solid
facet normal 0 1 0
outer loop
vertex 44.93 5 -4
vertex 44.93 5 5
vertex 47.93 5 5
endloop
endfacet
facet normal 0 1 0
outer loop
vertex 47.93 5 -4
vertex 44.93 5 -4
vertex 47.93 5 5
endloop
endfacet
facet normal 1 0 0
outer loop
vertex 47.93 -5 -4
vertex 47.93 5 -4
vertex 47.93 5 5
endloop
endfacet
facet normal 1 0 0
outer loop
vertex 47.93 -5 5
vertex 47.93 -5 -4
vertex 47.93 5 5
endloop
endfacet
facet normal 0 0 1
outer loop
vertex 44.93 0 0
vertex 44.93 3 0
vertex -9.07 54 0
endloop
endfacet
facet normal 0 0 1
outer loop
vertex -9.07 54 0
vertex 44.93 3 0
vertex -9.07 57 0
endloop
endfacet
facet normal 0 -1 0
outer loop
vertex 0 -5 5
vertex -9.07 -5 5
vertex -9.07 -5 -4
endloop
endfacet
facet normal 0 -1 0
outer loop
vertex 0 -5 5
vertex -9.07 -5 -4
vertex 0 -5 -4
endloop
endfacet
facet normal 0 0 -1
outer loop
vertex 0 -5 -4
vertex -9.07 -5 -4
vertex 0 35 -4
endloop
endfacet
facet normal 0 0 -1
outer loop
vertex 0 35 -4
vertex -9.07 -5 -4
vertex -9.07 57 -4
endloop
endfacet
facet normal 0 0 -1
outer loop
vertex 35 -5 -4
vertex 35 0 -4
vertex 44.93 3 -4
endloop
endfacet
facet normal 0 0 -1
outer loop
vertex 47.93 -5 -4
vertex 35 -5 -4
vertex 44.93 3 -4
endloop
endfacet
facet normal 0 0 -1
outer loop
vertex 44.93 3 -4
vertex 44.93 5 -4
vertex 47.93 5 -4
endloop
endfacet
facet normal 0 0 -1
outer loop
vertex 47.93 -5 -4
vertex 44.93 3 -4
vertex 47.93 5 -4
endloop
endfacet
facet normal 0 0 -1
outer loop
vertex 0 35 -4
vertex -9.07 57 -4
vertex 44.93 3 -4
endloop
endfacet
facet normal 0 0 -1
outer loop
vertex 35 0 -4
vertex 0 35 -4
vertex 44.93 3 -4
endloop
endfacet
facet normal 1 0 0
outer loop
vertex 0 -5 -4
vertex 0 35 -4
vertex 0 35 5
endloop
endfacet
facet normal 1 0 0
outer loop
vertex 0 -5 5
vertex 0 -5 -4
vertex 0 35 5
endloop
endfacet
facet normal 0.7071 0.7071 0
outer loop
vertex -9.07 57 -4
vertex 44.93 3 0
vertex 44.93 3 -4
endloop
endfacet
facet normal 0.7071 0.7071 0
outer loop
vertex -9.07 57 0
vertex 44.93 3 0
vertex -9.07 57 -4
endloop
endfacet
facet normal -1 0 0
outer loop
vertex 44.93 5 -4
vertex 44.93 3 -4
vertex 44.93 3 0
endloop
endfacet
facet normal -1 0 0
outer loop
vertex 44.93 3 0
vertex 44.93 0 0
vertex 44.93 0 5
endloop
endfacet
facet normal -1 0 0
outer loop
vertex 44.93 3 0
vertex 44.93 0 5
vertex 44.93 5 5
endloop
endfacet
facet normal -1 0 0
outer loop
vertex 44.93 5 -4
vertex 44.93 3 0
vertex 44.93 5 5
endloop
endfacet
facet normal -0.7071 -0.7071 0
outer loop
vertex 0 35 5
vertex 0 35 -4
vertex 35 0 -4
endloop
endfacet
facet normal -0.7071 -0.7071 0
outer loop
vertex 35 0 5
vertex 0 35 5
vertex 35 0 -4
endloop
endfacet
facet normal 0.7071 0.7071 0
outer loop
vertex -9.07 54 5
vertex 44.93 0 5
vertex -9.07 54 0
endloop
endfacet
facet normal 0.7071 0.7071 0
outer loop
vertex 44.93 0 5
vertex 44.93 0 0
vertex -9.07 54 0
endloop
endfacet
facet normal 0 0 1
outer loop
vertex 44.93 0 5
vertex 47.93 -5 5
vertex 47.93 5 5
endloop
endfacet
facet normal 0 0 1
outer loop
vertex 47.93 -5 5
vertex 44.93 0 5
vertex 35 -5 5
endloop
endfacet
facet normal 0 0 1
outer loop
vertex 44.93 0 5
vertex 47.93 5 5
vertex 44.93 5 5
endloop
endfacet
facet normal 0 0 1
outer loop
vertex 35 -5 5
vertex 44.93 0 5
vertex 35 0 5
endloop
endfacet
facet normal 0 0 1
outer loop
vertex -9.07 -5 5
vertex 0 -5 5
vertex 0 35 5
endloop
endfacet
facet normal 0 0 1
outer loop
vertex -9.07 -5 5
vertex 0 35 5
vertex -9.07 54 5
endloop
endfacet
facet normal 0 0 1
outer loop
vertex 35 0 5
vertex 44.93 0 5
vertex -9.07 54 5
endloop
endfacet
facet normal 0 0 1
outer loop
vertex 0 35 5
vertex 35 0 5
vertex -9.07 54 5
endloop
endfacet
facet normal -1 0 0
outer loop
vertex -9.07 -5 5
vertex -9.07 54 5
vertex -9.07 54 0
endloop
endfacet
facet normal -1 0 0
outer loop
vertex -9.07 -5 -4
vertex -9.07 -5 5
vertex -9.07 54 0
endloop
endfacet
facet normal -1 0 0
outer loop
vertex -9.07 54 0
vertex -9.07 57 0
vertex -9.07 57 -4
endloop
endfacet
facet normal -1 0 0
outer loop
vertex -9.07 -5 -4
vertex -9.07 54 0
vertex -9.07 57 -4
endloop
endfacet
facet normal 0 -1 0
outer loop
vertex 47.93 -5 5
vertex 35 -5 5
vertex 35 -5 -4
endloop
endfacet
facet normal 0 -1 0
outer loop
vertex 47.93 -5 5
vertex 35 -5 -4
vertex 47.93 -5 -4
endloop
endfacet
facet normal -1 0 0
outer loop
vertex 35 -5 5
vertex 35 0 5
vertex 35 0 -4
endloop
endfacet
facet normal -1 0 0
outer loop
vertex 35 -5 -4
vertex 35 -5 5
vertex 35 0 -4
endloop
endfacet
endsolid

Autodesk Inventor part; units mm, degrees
ref_plane "YZ Plane" through (0, 0, 0) normal (1, 0, 0) x (0, 1, 0)
ref_plane "XZ Plane" through (0, 0, 0) normal (0, 1, 0) x (-1, 0, 0)
sketch "Boceto1" plane through (0, 0, 0) normal (0, 0, 1) x (1, 0, 0)
  line L0 (-9.0701, 0) -> (44.9299, 0)
  line L1 (44.9299, 0) -> (-9.0701, 54)
  line L2 (-9.0701, 0) -> (-9.0701, 54)
  point P0 (0, 0)
  dimension "d0" = 54
  dimension "d2" = 45
extrude "Extrusión1" add sketch "Boceto1" along normal blind 5
sketch "Boceto2" plane through (0, 0, 5) normal (0, 0, 1) x (1, 0, 0)
  line L0 (44.9299, 0) -> (-9.0701, 54) projected
  line L1 (44.9299, 5) -> (47.9299, 5)
  line L2 (47.9299, 5) -> (47.9299, 0)
  line L3 (47.9299, 0) -> (44.9299, 0)
  line L4 (44.9299, 0) -> (44.9299, 5)
  point P0 (0, 0)
  dimension "d9" = 3
  dimension "d10" = 5
extrude "Extrusión2" add sketch "Boceto2" against normal blind 9
sketch "Boceto4" plane through (0, 0, 0) normal (0, 0, -1) x (-1, 0, 0)
  line L0 (-48.0778, 0) -> (35.3608, 0) construction
  line L1 (-47.9299, 5) -> (-47.9299, 0) projected
  line L2 (-47.9299, 0) -> (9.0701, 57)
  line L3 (-47.9299, 0) -> (40.6563, 0) construction
  line L4 (9.0701, 0) -> (9.0701, 57)
  line L5 (9.0701, 0) -> (-47.9299, 0)
  point P0 (0, 0)
  dimension "d24" = 45
extrude "Extrusión3" add sketch "Boceto4" along normal blind 4
sketch "Boceto5" plane through (0, 0, -4) normal (0, 0, -1) x (-1, 0, 0)
  line L0 (0, 0) -> (0, 35)
  line L1 (0, 35) -> (-35, 0)
  line L2 (0, 35) -> (67.1316, 35) construction
  line L3 (0, 0) -> (-35, 0)
  line L4 (9.0701, 0) -> (-44.9299, 0) projected
  dimension "d19" = 35
  dimension "d20" = 135
extrude "Extrusión4" cut sketch "Boceto5" against normal blind 15
sketch "Boceto6" plane through (-9.0701, 0, -4) normal (0, -1, 0) x (1, 0, 0)
  line L0 (9.0701, 0) -> (9.0701, 9) projected
  line L1 (9.0701, 9) -> (0, 9)
  line L2 (0, 9) -> (0, 0)
  line L3 (0, 0) -> (9.0701, 0)
  line L4 (9.0701, 0) -> (9.0701, 9)
  point P0 (9.0701, 4)
extrude "Extrusión5" add sketch "Boceto6" along normal blind 5
sketch "Boceto7" plane through (44.9299, 0, 5) normal (0, -1, 0) x (1, 0, 0)
  line L0 (-9.9299, -9) -> (-44.9299, -9) projected
  line L1 (3, 0) -> (0, 0) projected
  line L2 (-9.9299, -9) -> (3, -9)
  line L3 (3, -9) -> (3, 0)
  line L4 (3, 0) -> (-9.9299, 0)
  line L5 (-9.9299, 0) -> (-9.9299, -9)
  point P0 (-44.9299, -5)
extrude "Extrusión6" add sketch "Boceto7" along normal blind 5
ref_plane "Plano de trabajo1" through (0, 0, 16) normal (0, 0, 1) x (1, 0, 0)
properties part number "BaseBeamSplitter-D" material "Plástico ABS"
